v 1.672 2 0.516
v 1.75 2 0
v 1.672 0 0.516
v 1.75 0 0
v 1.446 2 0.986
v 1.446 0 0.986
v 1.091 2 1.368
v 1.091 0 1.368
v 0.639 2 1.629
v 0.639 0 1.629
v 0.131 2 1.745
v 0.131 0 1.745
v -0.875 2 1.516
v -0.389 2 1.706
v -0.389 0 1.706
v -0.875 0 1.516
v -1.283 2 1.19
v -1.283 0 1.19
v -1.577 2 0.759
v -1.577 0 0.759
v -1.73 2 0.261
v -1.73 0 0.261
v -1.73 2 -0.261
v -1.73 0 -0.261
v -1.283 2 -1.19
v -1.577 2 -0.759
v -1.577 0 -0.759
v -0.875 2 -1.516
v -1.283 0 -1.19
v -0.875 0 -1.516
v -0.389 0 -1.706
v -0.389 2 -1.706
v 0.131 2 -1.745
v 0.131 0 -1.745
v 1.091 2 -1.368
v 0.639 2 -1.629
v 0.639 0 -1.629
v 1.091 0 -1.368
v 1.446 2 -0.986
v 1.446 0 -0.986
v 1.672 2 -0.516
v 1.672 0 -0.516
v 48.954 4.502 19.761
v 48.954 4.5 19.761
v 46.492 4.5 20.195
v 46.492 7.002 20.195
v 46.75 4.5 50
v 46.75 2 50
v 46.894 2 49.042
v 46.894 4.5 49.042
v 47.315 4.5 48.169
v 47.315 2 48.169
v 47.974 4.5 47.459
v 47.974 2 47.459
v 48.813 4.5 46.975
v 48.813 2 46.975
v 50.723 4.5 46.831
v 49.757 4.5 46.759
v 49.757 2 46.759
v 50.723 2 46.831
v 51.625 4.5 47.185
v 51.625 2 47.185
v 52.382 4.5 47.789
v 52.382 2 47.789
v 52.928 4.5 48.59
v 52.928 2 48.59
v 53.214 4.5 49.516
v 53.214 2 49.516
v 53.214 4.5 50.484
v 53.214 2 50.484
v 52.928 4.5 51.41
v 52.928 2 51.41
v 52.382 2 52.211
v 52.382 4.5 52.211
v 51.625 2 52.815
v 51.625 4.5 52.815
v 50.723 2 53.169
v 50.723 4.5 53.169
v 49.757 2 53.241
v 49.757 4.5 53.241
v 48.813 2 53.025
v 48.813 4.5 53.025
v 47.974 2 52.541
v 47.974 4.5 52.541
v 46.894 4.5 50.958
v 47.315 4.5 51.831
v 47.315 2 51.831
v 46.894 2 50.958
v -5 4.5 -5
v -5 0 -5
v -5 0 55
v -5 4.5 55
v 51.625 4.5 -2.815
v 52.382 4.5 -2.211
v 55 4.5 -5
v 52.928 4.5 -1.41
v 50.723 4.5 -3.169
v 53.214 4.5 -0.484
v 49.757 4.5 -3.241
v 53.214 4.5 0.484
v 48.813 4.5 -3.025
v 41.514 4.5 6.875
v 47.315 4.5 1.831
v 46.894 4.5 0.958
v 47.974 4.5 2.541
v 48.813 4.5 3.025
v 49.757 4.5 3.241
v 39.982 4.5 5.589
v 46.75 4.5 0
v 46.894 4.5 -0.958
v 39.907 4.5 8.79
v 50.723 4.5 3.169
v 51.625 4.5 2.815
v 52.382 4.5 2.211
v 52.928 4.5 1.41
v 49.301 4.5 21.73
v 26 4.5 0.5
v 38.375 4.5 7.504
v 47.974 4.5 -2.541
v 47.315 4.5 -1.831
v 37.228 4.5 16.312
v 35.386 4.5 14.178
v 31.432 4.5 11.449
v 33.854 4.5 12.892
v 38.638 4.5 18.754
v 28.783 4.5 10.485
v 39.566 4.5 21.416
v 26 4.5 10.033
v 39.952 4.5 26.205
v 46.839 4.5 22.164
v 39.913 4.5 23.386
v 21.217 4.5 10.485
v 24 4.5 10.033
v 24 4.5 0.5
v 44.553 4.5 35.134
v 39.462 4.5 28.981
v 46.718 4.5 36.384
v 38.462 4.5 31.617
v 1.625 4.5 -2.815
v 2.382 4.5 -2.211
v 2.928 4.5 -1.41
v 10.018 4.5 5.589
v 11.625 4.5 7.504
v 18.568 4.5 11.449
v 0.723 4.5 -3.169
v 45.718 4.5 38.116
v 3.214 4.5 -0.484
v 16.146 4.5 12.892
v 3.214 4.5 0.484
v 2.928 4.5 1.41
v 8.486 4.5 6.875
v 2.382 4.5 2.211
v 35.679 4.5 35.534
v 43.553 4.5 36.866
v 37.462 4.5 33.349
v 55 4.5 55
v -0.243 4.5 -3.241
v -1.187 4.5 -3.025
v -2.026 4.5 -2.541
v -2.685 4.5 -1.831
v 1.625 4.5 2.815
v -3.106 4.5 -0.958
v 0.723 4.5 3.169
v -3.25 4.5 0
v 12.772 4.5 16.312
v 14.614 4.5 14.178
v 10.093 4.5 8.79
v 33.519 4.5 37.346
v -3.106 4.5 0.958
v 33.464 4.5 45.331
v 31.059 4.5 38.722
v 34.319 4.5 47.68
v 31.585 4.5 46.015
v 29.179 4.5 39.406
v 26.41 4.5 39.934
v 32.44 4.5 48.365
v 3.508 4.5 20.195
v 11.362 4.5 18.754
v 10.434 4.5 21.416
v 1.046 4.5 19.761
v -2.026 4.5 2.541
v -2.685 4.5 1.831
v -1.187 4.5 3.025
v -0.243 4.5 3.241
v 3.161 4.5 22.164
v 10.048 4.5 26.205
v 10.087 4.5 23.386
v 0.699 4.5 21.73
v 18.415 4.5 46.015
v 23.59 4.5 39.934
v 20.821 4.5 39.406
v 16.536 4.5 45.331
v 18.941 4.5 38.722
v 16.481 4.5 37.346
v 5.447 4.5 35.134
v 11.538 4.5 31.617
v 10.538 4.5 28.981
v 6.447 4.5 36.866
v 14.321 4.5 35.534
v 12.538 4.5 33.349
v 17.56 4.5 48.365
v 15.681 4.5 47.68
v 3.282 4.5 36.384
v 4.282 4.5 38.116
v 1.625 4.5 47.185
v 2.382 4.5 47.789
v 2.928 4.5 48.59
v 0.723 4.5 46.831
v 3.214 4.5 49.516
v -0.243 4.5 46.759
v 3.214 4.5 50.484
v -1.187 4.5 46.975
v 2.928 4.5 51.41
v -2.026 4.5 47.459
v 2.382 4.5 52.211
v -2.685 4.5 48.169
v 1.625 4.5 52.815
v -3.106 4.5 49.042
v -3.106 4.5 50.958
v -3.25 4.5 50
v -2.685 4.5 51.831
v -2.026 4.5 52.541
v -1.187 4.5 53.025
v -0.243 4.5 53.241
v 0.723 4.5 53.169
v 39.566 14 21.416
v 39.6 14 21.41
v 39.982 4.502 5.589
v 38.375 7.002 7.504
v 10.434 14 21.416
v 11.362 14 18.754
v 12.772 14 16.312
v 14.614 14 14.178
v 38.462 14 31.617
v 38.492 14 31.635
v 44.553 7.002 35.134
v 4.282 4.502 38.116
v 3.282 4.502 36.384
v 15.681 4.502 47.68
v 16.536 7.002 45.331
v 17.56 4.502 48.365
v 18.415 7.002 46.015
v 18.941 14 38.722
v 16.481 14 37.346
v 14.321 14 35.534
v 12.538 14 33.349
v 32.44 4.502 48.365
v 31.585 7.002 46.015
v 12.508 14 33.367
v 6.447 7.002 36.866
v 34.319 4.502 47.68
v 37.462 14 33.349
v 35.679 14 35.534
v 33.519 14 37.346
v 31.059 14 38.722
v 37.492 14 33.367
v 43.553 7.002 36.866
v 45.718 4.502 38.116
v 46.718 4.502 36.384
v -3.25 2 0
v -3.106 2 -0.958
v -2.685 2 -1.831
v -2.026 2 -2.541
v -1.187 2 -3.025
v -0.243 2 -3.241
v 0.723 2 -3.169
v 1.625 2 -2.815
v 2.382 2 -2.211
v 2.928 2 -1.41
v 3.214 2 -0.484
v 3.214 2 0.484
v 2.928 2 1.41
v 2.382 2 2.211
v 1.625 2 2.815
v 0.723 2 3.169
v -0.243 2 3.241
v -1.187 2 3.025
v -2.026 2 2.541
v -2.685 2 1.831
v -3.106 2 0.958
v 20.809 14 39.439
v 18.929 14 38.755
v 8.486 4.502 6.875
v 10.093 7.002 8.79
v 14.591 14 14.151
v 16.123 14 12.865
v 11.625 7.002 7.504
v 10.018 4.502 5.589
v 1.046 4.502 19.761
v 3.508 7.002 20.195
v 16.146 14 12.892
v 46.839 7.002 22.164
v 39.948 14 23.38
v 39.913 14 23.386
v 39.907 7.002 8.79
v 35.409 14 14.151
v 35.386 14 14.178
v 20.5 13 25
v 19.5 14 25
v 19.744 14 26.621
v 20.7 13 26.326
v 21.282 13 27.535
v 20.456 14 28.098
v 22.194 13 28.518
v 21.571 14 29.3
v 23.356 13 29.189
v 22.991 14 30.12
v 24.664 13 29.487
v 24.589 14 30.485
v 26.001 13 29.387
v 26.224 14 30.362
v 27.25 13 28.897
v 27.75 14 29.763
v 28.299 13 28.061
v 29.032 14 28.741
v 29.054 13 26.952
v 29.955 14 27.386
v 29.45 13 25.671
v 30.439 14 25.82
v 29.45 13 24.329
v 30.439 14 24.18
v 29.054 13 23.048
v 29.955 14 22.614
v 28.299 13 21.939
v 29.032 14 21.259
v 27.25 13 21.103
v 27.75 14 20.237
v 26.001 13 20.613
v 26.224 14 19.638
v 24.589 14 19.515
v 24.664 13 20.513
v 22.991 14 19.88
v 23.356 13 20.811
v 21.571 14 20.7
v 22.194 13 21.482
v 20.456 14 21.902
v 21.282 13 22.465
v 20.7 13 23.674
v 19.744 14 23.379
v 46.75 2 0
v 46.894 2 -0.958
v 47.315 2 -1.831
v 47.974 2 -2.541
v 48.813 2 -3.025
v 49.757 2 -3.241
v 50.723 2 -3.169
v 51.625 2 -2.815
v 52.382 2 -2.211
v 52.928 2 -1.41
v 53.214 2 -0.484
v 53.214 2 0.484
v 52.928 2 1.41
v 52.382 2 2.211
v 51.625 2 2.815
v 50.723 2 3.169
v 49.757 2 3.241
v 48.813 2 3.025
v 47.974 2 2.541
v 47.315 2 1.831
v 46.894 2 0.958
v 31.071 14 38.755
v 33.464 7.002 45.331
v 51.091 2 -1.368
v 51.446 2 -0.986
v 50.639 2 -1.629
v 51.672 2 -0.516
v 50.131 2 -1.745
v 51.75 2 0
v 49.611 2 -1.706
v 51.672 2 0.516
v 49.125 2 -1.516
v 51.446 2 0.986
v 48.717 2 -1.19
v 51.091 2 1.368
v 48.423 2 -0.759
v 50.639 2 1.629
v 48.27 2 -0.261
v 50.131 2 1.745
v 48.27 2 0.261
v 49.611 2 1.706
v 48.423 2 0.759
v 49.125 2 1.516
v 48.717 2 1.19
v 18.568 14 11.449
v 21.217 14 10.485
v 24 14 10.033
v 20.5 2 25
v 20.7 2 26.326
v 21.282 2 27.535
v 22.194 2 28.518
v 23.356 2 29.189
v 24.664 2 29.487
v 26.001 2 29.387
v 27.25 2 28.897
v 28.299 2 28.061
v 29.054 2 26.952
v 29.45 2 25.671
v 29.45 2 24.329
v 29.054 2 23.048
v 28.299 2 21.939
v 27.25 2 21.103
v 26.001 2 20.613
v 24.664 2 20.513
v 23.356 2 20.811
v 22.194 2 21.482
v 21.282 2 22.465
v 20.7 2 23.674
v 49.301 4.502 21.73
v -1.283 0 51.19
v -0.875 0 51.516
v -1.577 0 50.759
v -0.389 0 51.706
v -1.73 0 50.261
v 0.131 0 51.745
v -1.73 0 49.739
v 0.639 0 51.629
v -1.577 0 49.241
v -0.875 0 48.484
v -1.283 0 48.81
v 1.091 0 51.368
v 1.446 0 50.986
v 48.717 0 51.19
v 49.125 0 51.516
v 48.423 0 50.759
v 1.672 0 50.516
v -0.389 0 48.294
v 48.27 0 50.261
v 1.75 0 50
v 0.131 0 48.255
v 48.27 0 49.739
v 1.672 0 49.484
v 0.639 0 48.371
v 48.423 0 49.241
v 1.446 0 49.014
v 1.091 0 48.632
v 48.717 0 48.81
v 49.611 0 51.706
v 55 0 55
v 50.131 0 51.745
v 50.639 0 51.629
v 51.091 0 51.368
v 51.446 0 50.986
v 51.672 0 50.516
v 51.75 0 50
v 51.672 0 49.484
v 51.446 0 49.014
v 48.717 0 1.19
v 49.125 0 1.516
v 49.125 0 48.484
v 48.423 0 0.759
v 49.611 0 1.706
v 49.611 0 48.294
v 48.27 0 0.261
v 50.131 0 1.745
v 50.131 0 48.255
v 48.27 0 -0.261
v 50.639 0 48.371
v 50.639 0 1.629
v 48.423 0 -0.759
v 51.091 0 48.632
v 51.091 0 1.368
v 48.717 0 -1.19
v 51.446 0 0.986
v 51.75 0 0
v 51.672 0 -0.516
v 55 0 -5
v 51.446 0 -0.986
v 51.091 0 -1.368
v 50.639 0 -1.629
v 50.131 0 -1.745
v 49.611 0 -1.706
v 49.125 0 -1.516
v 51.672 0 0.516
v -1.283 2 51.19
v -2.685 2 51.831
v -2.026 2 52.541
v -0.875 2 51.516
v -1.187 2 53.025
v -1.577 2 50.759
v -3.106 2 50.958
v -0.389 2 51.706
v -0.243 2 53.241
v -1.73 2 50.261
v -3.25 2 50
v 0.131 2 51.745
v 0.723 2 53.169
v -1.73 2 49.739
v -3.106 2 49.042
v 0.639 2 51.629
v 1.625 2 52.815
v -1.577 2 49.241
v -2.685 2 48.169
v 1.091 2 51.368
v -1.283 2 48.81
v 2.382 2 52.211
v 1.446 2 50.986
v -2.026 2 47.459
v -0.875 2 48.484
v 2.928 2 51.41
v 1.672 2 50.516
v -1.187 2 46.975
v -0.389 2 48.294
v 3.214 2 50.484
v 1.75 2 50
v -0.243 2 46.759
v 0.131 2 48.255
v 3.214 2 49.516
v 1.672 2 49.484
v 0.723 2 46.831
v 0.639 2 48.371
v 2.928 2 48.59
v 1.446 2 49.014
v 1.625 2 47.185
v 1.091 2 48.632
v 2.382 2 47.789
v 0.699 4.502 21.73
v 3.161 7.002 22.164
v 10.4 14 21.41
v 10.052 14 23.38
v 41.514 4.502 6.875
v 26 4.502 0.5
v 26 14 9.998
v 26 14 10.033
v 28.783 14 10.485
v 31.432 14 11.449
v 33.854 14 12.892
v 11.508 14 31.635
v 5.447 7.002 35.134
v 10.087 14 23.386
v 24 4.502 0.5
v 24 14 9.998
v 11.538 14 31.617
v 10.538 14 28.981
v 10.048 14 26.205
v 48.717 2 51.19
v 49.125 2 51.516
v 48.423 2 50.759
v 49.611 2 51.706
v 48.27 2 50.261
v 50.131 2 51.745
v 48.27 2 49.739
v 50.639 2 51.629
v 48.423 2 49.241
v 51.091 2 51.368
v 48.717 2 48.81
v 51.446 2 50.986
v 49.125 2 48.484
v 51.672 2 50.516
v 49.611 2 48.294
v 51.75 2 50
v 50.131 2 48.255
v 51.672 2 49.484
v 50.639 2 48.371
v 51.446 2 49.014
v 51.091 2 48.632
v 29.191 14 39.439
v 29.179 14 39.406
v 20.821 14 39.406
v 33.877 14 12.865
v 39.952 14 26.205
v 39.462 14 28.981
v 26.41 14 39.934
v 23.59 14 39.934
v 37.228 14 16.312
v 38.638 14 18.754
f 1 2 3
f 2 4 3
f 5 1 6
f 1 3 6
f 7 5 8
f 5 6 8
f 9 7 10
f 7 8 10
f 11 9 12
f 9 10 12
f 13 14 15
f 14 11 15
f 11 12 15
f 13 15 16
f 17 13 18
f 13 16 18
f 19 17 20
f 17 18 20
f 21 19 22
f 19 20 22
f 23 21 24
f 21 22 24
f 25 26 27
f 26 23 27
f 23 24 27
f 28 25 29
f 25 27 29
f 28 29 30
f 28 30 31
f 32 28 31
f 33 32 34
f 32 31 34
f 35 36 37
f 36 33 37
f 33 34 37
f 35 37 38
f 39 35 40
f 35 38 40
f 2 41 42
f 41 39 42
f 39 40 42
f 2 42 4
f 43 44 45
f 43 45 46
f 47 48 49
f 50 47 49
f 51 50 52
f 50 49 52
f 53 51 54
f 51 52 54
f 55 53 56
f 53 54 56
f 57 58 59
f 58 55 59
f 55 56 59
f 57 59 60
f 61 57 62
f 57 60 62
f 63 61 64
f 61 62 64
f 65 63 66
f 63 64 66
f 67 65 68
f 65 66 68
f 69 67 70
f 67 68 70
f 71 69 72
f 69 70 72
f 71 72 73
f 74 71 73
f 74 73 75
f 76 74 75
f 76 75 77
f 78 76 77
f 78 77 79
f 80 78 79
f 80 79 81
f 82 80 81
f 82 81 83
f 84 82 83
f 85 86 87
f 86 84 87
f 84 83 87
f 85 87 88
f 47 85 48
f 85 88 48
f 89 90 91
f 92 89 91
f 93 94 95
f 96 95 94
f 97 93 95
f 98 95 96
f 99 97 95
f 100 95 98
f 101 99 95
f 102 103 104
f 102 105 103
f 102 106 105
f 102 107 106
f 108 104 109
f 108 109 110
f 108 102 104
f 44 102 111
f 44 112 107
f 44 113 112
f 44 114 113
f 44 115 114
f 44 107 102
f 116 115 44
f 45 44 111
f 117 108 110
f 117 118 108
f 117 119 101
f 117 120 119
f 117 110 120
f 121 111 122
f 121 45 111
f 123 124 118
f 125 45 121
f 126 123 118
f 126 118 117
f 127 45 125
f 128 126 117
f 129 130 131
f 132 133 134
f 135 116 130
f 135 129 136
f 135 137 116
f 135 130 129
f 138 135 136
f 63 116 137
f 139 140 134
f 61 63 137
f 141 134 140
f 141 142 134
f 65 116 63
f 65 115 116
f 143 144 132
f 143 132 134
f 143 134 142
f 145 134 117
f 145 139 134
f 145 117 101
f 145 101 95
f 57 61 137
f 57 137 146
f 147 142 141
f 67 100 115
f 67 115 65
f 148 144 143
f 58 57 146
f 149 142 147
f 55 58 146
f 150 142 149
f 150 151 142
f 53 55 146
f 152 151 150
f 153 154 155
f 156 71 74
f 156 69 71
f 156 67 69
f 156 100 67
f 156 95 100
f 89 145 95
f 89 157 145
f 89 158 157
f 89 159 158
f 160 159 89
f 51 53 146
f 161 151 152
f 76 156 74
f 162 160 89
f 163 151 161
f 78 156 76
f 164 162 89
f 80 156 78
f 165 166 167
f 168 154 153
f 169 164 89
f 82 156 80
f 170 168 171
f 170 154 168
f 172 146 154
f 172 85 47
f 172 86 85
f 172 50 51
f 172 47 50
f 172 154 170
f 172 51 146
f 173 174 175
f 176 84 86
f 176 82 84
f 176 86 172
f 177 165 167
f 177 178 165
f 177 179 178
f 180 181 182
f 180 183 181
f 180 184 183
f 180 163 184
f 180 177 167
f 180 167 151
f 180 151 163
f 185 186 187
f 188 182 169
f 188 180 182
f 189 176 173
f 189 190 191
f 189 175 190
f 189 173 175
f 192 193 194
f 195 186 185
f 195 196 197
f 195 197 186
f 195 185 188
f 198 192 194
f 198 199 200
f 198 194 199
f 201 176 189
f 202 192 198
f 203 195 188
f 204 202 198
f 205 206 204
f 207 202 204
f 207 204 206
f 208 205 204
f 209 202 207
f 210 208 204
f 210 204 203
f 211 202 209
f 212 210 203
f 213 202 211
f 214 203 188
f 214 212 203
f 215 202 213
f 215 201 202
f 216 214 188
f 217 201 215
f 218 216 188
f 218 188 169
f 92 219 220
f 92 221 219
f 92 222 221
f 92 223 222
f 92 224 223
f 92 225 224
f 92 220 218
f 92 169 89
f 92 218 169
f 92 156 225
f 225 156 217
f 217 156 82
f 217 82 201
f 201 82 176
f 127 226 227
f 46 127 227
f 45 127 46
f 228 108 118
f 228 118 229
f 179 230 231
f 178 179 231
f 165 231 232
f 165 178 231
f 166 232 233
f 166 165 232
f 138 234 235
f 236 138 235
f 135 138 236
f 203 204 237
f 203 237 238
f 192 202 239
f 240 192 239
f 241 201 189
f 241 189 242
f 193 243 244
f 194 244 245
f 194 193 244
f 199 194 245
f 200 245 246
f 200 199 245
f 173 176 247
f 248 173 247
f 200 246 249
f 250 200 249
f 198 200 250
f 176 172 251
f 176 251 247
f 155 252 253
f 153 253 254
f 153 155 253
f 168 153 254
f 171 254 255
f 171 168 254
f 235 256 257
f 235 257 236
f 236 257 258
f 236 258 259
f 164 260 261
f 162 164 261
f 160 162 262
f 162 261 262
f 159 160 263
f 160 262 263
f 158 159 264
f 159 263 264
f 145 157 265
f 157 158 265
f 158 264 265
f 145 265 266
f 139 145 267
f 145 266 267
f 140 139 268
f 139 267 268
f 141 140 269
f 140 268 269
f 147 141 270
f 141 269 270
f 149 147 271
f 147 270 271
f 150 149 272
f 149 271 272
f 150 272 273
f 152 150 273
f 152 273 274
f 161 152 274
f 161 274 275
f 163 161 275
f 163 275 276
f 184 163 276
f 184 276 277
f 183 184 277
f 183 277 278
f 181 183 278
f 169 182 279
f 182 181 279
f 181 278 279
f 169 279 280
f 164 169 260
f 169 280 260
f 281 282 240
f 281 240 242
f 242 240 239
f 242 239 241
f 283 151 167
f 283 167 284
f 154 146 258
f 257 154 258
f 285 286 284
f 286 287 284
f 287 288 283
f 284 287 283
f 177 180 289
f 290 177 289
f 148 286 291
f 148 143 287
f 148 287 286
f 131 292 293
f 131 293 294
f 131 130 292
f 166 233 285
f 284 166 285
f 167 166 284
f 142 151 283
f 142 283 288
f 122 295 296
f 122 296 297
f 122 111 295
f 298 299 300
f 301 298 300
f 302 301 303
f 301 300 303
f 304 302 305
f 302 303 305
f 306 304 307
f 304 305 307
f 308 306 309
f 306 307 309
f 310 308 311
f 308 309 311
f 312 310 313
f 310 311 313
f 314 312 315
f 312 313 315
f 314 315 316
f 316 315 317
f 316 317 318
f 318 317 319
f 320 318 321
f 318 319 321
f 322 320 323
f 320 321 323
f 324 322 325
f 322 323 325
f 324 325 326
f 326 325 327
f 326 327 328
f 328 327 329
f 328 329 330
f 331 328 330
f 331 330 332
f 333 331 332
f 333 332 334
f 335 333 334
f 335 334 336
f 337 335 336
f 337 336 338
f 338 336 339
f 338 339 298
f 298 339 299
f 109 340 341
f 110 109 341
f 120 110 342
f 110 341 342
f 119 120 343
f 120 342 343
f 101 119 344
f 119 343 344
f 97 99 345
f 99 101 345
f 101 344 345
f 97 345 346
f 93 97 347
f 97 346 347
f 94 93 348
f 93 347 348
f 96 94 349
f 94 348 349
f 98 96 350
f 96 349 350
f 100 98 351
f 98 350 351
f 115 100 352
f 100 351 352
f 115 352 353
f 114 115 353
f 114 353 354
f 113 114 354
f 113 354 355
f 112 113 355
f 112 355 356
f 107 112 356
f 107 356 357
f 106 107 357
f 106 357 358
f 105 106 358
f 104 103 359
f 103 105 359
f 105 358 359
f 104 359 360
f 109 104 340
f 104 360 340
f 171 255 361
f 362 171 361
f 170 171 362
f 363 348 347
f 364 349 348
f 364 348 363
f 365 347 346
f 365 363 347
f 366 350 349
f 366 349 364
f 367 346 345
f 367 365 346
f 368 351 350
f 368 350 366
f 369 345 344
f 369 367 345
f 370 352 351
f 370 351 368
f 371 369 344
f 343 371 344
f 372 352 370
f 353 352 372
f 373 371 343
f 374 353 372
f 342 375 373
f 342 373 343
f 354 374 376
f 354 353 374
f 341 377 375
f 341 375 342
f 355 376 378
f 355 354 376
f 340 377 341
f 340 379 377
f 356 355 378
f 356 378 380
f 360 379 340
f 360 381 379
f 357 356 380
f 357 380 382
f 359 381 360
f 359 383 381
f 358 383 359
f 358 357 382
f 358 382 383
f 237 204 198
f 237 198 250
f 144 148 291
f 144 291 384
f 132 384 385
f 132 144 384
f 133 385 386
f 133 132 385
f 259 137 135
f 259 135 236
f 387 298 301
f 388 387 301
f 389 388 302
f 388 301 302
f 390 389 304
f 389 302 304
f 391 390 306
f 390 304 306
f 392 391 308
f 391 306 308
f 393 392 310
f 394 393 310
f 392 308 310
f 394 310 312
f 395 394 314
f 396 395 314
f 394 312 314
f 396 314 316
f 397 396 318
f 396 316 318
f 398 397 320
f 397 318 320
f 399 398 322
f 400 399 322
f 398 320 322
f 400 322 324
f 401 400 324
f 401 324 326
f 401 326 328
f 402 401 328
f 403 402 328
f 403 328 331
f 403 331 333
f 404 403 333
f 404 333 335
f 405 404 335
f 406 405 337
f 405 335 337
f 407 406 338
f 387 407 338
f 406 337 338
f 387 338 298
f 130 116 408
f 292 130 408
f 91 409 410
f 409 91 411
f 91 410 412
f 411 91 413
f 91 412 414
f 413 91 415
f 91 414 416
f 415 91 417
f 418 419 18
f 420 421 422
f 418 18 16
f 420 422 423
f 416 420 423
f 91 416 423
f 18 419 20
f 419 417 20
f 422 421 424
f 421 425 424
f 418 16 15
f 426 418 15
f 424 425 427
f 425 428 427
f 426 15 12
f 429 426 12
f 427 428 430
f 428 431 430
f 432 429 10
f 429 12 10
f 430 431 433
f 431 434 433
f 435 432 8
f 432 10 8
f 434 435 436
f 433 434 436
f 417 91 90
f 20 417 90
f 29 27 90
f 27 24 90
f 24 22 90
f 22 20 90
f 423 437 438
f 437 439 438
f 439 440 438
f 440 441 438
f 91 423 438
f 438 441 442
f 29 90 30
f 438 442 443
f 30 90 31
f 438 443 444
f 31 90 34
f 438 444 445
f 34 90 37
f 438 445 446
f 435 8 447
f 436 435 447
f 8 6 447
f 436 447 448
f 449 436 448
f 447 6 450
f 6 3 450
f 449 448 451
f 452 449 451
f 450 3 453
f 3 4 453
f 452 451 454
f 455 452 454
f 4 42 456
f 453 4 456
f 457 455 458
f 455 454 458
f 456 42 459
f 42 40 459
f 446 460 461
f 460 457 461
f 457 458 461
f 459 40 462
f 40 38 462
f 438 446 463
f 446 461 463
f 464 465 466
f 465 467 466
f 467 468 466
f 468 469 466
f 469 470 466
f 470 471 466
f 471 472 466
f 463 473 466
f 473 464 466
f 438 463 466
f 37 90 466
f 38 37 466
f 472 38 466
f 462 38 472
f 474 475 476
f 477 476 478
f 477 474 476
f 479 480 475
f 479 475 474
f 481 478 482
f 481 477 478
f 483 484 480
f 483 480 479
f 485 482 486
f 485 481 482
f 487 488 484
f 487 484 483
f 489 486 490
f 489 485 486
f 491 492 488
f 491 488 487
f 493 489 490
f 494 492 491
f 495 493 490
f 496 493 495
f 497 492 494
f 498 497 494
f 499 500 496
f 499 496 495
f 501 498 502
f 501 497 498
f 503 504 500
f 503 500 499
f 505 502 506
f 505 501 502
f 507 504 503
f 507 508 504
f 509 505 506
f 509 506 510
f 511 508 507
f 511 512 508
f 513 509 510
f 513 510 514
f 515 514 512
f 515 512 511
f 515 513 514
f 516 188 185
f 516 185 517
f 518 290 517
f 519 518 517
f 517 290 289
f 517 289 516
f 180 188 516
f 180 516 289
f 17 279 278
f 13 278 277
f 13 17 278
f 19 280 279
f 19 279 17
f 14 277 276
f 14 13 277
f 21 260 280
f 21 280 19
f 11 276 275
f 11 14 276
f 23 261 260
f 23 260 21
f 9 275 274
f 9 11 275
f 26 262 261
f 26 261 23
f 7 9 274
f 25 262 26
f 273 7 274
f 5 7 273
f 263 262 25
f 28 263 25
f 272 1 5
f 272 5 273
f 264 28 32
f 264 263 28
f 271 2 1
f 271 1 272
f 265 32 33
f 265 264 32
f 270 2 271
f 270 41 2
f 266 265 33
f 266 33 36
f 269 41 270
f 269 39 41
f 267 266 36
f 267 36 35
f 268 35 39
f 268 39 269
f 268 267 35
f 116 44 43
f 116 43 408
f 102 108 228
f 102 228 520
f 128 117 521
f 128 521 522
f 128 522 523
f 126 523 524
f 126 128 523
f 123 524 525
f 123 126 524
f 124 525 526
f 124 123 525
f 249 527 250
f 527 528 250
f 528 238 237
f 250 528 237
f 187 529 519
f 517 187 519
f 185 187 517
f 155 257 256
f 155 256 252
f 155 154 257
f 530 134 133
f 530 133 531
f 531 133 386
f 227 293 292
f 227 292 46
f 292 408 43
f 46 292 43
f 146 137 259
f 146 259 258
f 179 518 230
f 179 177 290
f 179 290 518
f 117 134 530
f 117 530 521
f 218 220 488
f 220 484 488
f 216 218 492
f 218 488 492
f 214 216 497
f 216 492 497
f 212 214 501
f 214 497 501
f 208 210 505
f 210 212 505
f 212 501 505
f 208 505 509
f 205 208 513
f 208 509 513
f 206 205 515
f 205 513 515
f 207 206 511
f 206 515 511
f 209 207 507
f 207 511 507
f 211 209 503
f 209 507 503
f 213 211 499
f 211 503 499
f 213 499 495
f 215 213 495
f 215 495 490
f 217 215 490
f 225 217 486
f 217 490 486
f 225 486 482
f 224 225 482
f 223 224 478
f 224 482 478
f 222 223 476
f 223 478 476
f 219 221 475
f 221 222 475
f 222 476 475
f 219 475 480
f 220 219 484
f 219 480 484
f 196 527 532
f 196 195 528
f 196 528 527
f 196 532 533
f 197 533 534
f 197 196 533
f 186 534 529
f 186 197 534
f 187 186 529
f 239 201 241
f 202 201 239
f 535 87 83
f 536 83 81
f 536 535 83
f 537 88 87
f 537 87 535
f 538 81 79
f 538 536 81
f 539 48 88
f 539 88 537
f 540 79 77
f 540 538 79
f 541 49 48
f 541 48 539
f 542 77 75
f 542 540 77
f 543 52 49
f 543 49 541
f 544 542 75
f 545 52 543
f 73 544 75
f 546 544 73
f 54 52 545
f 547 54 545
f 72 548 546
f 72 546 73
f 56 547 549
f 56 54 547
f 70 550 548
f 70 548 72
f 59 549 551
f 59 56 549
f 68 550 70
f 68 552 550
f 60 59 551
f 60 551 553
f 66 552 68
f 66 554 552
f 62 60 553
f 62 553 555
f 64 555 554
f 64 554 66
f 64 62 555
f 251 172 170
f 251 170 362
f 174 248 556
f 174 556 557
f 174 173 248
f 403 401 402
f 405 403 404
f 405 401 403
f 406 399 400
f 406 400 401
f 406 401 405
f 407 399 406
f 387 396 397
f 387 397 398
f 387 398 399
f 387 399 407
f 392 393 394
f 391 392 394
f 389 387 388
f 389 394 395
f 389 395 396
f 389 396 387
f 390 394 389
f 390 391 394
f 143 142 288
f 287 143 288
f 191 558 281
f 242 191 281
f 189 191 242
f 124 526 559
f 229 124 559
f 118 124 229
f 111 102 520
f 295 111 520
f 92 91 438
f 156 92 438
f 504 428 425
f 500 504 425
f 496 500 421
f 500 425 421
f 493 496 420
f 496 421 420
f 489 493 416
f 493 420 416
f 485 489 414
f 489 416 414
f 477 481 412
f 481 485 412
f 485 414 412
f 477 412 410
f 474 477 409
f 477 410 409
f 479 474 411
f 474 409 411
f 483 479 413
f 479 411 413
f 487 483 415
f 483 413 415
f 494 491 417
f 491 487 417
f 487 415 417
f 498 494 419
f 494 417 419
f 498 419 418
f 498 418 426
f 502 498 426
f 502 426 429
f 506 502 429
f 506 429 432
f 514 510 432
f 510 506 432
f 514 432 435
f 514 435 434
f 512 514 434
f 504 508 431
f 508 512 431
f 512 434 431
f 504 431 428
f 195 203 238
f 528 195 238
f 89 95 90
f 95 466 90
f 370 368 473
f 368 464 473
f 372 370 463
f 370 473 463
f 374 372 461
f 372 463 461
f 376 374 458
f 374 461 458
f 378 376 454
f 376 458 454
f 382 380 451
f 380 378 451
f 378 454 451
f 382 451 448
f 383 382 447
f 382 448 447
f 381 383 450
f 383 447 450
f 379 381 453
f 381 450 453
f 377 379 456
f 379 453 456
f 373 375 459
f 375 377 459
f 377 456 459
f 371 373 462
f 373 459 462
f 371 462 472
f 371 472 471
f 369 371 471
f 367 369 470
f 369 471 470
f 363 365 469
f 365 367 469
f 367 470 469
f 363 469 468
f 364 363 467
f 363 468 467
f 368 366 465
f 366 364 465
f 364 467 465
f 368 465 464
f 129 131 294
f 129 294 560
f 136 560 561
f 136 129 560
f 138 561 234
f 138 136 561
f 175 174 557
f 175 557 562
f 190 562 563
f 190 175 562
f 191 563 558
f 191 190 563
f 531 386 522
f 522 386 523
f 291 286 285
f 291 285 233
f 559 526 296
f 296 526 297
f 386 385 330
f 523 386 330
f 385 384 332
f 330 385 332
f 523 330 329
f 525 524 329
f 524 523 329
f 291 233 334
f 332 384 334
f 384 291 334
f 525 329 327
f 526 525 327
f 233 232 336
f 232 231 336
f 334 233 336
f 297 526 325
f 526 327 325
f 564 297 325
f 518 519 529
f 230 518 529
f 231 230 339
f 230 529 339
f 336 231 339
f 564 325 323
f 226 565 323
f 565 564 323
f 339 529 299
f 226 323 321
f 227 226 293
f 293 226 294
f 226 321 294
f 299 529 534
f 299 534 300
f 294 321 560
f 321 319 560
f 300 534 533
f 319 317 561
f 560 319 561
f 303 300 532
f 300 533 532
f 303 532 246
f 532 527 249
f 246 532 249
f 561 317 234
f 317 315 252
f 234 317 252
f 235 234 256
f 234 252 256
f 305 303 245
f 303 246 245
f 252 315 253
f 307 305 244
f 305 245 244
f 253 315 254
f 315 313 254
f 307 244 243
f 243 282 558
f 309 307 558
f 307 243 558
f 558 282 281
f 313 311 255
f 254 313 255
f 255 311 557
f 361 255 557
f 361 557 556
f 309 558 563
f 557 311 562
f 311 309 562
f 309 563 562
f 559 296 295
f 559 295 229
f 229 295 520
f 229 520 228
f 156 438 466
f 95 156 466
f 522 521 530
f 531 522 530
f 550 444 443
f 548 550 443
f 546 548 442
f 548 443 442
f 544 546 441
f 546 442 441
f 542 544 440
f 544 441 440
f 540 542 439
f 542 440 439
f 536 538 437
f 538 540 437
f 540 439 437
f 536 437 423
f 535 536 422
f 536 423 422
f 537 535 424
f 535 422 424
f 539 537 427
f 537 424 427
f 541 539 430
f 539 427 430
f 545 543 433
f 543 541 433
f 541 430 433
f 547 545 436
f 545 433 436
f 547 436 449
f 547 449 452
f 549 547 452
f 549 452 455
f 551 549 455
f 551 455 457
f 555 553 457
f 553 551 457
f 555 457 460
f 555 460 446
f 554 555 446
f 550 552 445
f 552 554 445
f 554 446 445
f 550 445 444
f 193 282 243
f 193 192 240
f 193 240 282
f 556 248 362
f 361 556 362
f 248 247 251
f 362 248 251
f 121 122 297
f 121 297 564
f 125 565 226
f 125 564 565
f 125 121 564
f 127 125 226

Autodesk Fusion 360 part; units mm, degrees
sketch "Sketch1" plane through (0, 0, 0) normal (0, 1, 0) x (1, 0, 0)
  circle A0 centre (0, 0) radius 1.75
  circle A1 centre (50, 0) radius 1.75
  circle A2 centre (0, -50) radius 1.75
  circle A3 centre (50, -50) radius 1.75
  circle A4 centre (25, -25) radius 4.5
  line L0 (-5, 5) -> (55, 5)
  line L1 (55, 5) -> (55, -55)
  line L2 (55, -55) -> (-5, -55)
  line L3 (-5, -55) -> (-5, 5)
  dimension "d1" = 50
  dimension "d2" = 50
  dimension "d3" = 3.5
  dimension "d4" = 3.5
  dimension "d5" = 3.5
  dimension "d6" = 3.5
  dimension "d7" = 9
extrude "Extrude1" add sketch "Sketch1" along normal blind 4 contours A4 | L0 L1 L2 L3
sketch "Sketch2" plane through (0, 4, 0) normal (0, 1, 0) x (-1, 0, 0)
  circle A0 centre (0, 0) radius 1.75
  circle A1 centre (-50, 0) radius 1.75
  circle A2 centre (0, 50) radius 1.75
  circle A3 centre (-50, 50) radius 1.75
  line L0 (5, 55) -> (-55, 55)
  line L1 (-55, 55) -> (-55, -5)
  line L2 (-55, -5) -> (5, -5)
  line L3 (5, -5) -> (5, 55)
  circle A4 centre (0, 0) radius 3.25
  circle A5 centre (-50, 0) radius 3.25
  circle A6 centre (0, 50) radius 3.25
  circle A7 centre (-50, 50) radius 3.25
  dimension "d10" = 6.5
  dimension "d11" = 6.5
  dimension "d12" = 6.5
  dimension "d13" = 6.5
extrude "Extrude2" add sketch "Sketch2" along normal blind 0.5 contours L0 L1 L2 L3
extrude "Extrude3" cut 1 faces at (-2.7314, 4, -0.2484) along direction (0, -1, 0) blind 2
extrude "Extrude4" cut 1 faces at (-2.7314, 4, 49.7516) along direction (0, -1, 0) blind 2
sketch "Sketch3" plane through (0, 4, 0) normal (0, 1, 0) x (-1, 0, 0)
  circle A0 centre (-50, 0) radius 3.25
  circle A1 centre (-50, 0) radius 1.75
extrude "Extrude5" cut sketch "Sketch3" against normal blind 2
extrude "Extrude6" cut 1 faces at (47.2686, 4, 49.7516) along direction (0, -1, 0) blind 2
sketch "Sketch4" plane through (0, 4.5, 0) normal (0, 1, 0) x (-1, 0, 0)
  circle A0 centre (-50, 50) radius 3.25
  circle A1 centre (-50, 0) radius 3.25
  circle A2 centre (0, 50) radius 3.25
  circle A3 centre (0, 0) radius 3.25
  line L0 (5, -5) -> (5, 55)
  line L1 (5, 55) -> (-55, 55)
  line L2 (-55, 55) -> (-55, -5)
  line L3 (-55, -5) -> (5, -5)
  line L4 (-24, 3) -> (-26, 3)
  line L5 (-10.0926, 8.7898) -> (-11.6247, 7.5042)
  line L6 (-3.1606, 22.1645) -> (-3.5079, 20.1949)
  line L7 (-6.4474, 36.866) -> (-5.4474, 35.134)
  line L8 (-18.4152, 46.0153) -> (-16.5359, 45.3312)
  line L9 (-33.4641, 45.3312) -> (-31.5848, 46.0153)
  line L10 (-44.5526, 35.134) -> (-43.5526, 36.866)
  line L11 (-46.4921, 20.1949) -> (-46.8394, 22.1645)
  line L12 (-38.3753, 7.5042) -> (-39.9074, 8.7898)
  circle A4 centre (-25, 25) radius 15
  line L13 (-11.6247, 7.5042) -> (-16.1457, 12.8921)
  line L14 (-14.6136, 14.1777) -> (-10.0926, 8.7898)
  line L15 (-24, 10.0334) -> (-24, 3)
  line L16 (-26, 3) -> (-26, 10.0334)
  line L17 (-33.8543, 12.8921) -> (-38.3753, 7.5042)
  line L18 (-39.9074, 8.7898) -> (-35.3864, 14.1777)
  line L19 (-39.5656, 21.4163) -> (-46.4921, 20.1949)
  line L20 (-46.8394, 22.1645) -> (-39.9129, 23.3859)
  line L21 (-38.4615, 31.6173) -> (-44.5526, 35.134)
  line L22 (-43.5526, 36.866) -> (-37.4615, 33.3493)
  line L23 (-31.0586, 38.722) -> (-33.4641, 45.3312)
  line L24 (-31.5848, 46.0153) -> (-29.1792, 39.4061)
  line L25 (-20.8208, 39.4061) -> (-18.4152, 46.0153)
  line L26 (-16.5359, 45.3312) -> (-18.9414, 38.722)
  line L27 (-12.5385, 33.3493) -> (-6.4474, 36.866)
  line L28 (-5.4474, 35.134) -> (-11.5385, 31.6173)
  line L29 (-10.0871, 23.3859) -> (-3.1606, 22.1645)
  line L30 (-3.5079, 20.1949) -> (-10.4344, 21.4163)
  line L31 (-25.8167, 5.0167) -> (-26, 3) construction
  arc A5 (-26, 5.025) -> (-25.8167, 5.0167) centre (-25, 25) ccw
  dimension "d27" = 30
extrude "Extrude7" add sketch "Sketch4" along normal blind 9.5 contours L4 A4 L15 L16 | A4 | L5 A4 L13 L14 | L12 A4 L17 L18 | L6 A4 L29 L30 | L11 A4 L19 L20 | L10 A4 L21 L22 | L7 A4 L27 L28 | L9 A4 L23 L24 | L8 A4 L25 L26
extrude "Extrude8" add 1 faces at (24.6667, 7.6667, 3) along direction (0, 0, -1) blind 2.5
chamfer "Chamfer1" distance 9.5 angle 45 1 edges at (25, 14, 0.5)
extrude "Extrude9" add 1 faces at (10.6033, 7.6667, 8.3613) along direction (-0.642788, 0, -0.766044) blind 2.5
extrude "Extrude10" add 1 faces at (3.2763, 7.6667, 21.508) along direction (-0.984808, 0, -0.173648) blind 2.5
extrude "Extrude11" add 1 faces at (6.1141, 7.6667, 36.2887) along direction (-0.866025, 0, 0.5) blind 2.5
extrude "Extrude12" add 1 faces at (17.7888, 7.6667, 45.7872) along direction (-0.34202, 0, 0.939693) blind 2.5
extrude "Extrude13" add 1 faces at (32.8377, 7.6667, 45.5592) along direction (0.34202, 0, 0.939693) blind 2.5
extrude "Extrude14" add 1 faces at (44.2192, 7.6667, 35.7113) along direction (0.866025, 0, 0.5) blind 2.5
extrude "Extrude15" add 1 faces at (46.6079, 7.6667, 20.8515) along direction (0.984808, 0, -0.173648) blind 2.5
extrude "Extrude16" add 1 faces at (38.886, 7.6667, 7.9328) along direction (0.642788, 0, -0.766044) blind 2.5
chamfer "Chamfer2" distance 9.5 angle 45 8 edges at (49.1278, 14, 20.7456) (40.7483, 14, 6.2319) (46.2176, 14, 37.25) (9.2517, 14, 6.2319) (33.3795, 14, 48.0225) (16.6205, 14, 48.0225) (3.7824, 14, 37.25) (0.8722, 14, 20.7456)
sketch "Sketch5" plane through (0, 14, 0) normal (0, 1, 0) x (-1, 0, 0)
  line L0 (-10.4015, 21.4105) -> (-10.0542, 23.3801)
  line L1 (-10.0542, 23.3801) -> (-10.0871, 23.3859)
  arc A0 (-10.0871, 23.3859) -> (-11.5385, 31.6173) centre (-25, 25) ccw
  line L2 (-11.5385, 31.6173) -> (-11.5096, 31.634)
  line L3 (-11.5096, 31.634) -> (-12.5096, 33.366)
  line L4 (-12.5096, 33.366) -> (-12.5385, 33.3493)
  arc A1 (-12.5385, 33.3493) -> (-18.9414, 38.722) centre (-25, 25) ccw
  line L5 (-18.9414, 38.722) -> (-18.93, 38.7534)
  line L6 (-18.93, 38.7534) -> (-20.8094, 39.4374)
  line L7 (-20.8094, 39.4374) -> (-20.8208, 39.4061)
  arc A2 (-20.8208, 39.4061) -> (-29.1792, 39.4061) centre (-25, 25) ccw
  line L8 (-29.1792, 39.4061) -> (-29.1906, 39.4374)
  line L9 (-29.1906, 39.4374) -> (-31.07, 38.7534)
  line L10 (-31.07, 38.7534) -> (-31.0586, 38.722)
  arc A3 (-31.0586, 38.722) -> (-37.4615, 33.3493) centre (-25, 25) ccw
  line L11 (-37.4615, 33.3493) -> (-37.4904, 33.366)
  line L12 (-37.4904, 33.366) -> (-38.4904, 31.634)
  line L13 (-38.4904, 31.634) -> (-38.4615, 31.6173)
  arc A4 (-38.4615, 31.6173) -> (-39.9129, 23.3859) centre (-25, 25) ccw
  line L14 (-39.9129, 23.3859) -> (-39.9458, 23.3801)
  line L15 (-39.9458, 23.3801) -> (-39.5985, 21.4105)
  line L16 (-39.5985, 21.4105) -> (-39.5656, 21.4163)
  arc A5 (-39.5656, 21.4163) -> (-35.3864, 14.1777) centre (-25, 25) ccw
  line L17 (-35.3864, 14.1777) -> (-35.4079, 14.1521)
  line L18 (-35.4079, 14.1521) -> (-33.8758, 12.8665)
  line L19 (-33.8758, 12.8665) -> (-33.8543, 12.8921)
  arc A6 (-33.8543, 12.8921) -> (-26, 10.0334) centre (-25, 25) ccw
  line L20 (-26, 10.0334) -> (-26, 10)
  line L21 (-26, 10) -> (-24, 10)
  line L22 (-24, 10) -> (-24, 10.0334)
  arc A7 (-24, 10.0334) -> (-16.1457, 12.8921) centre (-25, 25) ccw
  line L23 (-16.1457, 12.8921) -> (-16.1242, 12.8665)
  line L24 (-16.1242, 12.8665) -> (-14.5921, 14.1521)
  line L25 (-14.5921, 14.1521) -> (-14.6136, 14.1777)
  arc A8 (-14.6136, 14.1777) -> (-10.4344, 21.4163) centre (-25, 25) ccw
  line L26 (-10.4344, 21.4163) -> (-10.4015, 21.4105)
  circle A9 centre (-25, 25) radius 4.5
  dimension "d50" = 9
extrude "Extrude17" cut sketch "Sketch5" against normal blind 12 contours A9
chamfer "Chamfer3" distance 1 angle 45 1 edges at (29.1955, 14, 26.6273)
sketch "Sketch6" plane through (55, 0, 0) normal (1, 0, 0) x (0, 0, -1)
  line L0 (-55, 0) -> (5, 0)
  line L1 (5, 0) -> (5, 4.5)
  line L2 (5, 4.5) -> (-55, 4.5)
  line L3 (-55, 4.5) -> (-55, 0)
